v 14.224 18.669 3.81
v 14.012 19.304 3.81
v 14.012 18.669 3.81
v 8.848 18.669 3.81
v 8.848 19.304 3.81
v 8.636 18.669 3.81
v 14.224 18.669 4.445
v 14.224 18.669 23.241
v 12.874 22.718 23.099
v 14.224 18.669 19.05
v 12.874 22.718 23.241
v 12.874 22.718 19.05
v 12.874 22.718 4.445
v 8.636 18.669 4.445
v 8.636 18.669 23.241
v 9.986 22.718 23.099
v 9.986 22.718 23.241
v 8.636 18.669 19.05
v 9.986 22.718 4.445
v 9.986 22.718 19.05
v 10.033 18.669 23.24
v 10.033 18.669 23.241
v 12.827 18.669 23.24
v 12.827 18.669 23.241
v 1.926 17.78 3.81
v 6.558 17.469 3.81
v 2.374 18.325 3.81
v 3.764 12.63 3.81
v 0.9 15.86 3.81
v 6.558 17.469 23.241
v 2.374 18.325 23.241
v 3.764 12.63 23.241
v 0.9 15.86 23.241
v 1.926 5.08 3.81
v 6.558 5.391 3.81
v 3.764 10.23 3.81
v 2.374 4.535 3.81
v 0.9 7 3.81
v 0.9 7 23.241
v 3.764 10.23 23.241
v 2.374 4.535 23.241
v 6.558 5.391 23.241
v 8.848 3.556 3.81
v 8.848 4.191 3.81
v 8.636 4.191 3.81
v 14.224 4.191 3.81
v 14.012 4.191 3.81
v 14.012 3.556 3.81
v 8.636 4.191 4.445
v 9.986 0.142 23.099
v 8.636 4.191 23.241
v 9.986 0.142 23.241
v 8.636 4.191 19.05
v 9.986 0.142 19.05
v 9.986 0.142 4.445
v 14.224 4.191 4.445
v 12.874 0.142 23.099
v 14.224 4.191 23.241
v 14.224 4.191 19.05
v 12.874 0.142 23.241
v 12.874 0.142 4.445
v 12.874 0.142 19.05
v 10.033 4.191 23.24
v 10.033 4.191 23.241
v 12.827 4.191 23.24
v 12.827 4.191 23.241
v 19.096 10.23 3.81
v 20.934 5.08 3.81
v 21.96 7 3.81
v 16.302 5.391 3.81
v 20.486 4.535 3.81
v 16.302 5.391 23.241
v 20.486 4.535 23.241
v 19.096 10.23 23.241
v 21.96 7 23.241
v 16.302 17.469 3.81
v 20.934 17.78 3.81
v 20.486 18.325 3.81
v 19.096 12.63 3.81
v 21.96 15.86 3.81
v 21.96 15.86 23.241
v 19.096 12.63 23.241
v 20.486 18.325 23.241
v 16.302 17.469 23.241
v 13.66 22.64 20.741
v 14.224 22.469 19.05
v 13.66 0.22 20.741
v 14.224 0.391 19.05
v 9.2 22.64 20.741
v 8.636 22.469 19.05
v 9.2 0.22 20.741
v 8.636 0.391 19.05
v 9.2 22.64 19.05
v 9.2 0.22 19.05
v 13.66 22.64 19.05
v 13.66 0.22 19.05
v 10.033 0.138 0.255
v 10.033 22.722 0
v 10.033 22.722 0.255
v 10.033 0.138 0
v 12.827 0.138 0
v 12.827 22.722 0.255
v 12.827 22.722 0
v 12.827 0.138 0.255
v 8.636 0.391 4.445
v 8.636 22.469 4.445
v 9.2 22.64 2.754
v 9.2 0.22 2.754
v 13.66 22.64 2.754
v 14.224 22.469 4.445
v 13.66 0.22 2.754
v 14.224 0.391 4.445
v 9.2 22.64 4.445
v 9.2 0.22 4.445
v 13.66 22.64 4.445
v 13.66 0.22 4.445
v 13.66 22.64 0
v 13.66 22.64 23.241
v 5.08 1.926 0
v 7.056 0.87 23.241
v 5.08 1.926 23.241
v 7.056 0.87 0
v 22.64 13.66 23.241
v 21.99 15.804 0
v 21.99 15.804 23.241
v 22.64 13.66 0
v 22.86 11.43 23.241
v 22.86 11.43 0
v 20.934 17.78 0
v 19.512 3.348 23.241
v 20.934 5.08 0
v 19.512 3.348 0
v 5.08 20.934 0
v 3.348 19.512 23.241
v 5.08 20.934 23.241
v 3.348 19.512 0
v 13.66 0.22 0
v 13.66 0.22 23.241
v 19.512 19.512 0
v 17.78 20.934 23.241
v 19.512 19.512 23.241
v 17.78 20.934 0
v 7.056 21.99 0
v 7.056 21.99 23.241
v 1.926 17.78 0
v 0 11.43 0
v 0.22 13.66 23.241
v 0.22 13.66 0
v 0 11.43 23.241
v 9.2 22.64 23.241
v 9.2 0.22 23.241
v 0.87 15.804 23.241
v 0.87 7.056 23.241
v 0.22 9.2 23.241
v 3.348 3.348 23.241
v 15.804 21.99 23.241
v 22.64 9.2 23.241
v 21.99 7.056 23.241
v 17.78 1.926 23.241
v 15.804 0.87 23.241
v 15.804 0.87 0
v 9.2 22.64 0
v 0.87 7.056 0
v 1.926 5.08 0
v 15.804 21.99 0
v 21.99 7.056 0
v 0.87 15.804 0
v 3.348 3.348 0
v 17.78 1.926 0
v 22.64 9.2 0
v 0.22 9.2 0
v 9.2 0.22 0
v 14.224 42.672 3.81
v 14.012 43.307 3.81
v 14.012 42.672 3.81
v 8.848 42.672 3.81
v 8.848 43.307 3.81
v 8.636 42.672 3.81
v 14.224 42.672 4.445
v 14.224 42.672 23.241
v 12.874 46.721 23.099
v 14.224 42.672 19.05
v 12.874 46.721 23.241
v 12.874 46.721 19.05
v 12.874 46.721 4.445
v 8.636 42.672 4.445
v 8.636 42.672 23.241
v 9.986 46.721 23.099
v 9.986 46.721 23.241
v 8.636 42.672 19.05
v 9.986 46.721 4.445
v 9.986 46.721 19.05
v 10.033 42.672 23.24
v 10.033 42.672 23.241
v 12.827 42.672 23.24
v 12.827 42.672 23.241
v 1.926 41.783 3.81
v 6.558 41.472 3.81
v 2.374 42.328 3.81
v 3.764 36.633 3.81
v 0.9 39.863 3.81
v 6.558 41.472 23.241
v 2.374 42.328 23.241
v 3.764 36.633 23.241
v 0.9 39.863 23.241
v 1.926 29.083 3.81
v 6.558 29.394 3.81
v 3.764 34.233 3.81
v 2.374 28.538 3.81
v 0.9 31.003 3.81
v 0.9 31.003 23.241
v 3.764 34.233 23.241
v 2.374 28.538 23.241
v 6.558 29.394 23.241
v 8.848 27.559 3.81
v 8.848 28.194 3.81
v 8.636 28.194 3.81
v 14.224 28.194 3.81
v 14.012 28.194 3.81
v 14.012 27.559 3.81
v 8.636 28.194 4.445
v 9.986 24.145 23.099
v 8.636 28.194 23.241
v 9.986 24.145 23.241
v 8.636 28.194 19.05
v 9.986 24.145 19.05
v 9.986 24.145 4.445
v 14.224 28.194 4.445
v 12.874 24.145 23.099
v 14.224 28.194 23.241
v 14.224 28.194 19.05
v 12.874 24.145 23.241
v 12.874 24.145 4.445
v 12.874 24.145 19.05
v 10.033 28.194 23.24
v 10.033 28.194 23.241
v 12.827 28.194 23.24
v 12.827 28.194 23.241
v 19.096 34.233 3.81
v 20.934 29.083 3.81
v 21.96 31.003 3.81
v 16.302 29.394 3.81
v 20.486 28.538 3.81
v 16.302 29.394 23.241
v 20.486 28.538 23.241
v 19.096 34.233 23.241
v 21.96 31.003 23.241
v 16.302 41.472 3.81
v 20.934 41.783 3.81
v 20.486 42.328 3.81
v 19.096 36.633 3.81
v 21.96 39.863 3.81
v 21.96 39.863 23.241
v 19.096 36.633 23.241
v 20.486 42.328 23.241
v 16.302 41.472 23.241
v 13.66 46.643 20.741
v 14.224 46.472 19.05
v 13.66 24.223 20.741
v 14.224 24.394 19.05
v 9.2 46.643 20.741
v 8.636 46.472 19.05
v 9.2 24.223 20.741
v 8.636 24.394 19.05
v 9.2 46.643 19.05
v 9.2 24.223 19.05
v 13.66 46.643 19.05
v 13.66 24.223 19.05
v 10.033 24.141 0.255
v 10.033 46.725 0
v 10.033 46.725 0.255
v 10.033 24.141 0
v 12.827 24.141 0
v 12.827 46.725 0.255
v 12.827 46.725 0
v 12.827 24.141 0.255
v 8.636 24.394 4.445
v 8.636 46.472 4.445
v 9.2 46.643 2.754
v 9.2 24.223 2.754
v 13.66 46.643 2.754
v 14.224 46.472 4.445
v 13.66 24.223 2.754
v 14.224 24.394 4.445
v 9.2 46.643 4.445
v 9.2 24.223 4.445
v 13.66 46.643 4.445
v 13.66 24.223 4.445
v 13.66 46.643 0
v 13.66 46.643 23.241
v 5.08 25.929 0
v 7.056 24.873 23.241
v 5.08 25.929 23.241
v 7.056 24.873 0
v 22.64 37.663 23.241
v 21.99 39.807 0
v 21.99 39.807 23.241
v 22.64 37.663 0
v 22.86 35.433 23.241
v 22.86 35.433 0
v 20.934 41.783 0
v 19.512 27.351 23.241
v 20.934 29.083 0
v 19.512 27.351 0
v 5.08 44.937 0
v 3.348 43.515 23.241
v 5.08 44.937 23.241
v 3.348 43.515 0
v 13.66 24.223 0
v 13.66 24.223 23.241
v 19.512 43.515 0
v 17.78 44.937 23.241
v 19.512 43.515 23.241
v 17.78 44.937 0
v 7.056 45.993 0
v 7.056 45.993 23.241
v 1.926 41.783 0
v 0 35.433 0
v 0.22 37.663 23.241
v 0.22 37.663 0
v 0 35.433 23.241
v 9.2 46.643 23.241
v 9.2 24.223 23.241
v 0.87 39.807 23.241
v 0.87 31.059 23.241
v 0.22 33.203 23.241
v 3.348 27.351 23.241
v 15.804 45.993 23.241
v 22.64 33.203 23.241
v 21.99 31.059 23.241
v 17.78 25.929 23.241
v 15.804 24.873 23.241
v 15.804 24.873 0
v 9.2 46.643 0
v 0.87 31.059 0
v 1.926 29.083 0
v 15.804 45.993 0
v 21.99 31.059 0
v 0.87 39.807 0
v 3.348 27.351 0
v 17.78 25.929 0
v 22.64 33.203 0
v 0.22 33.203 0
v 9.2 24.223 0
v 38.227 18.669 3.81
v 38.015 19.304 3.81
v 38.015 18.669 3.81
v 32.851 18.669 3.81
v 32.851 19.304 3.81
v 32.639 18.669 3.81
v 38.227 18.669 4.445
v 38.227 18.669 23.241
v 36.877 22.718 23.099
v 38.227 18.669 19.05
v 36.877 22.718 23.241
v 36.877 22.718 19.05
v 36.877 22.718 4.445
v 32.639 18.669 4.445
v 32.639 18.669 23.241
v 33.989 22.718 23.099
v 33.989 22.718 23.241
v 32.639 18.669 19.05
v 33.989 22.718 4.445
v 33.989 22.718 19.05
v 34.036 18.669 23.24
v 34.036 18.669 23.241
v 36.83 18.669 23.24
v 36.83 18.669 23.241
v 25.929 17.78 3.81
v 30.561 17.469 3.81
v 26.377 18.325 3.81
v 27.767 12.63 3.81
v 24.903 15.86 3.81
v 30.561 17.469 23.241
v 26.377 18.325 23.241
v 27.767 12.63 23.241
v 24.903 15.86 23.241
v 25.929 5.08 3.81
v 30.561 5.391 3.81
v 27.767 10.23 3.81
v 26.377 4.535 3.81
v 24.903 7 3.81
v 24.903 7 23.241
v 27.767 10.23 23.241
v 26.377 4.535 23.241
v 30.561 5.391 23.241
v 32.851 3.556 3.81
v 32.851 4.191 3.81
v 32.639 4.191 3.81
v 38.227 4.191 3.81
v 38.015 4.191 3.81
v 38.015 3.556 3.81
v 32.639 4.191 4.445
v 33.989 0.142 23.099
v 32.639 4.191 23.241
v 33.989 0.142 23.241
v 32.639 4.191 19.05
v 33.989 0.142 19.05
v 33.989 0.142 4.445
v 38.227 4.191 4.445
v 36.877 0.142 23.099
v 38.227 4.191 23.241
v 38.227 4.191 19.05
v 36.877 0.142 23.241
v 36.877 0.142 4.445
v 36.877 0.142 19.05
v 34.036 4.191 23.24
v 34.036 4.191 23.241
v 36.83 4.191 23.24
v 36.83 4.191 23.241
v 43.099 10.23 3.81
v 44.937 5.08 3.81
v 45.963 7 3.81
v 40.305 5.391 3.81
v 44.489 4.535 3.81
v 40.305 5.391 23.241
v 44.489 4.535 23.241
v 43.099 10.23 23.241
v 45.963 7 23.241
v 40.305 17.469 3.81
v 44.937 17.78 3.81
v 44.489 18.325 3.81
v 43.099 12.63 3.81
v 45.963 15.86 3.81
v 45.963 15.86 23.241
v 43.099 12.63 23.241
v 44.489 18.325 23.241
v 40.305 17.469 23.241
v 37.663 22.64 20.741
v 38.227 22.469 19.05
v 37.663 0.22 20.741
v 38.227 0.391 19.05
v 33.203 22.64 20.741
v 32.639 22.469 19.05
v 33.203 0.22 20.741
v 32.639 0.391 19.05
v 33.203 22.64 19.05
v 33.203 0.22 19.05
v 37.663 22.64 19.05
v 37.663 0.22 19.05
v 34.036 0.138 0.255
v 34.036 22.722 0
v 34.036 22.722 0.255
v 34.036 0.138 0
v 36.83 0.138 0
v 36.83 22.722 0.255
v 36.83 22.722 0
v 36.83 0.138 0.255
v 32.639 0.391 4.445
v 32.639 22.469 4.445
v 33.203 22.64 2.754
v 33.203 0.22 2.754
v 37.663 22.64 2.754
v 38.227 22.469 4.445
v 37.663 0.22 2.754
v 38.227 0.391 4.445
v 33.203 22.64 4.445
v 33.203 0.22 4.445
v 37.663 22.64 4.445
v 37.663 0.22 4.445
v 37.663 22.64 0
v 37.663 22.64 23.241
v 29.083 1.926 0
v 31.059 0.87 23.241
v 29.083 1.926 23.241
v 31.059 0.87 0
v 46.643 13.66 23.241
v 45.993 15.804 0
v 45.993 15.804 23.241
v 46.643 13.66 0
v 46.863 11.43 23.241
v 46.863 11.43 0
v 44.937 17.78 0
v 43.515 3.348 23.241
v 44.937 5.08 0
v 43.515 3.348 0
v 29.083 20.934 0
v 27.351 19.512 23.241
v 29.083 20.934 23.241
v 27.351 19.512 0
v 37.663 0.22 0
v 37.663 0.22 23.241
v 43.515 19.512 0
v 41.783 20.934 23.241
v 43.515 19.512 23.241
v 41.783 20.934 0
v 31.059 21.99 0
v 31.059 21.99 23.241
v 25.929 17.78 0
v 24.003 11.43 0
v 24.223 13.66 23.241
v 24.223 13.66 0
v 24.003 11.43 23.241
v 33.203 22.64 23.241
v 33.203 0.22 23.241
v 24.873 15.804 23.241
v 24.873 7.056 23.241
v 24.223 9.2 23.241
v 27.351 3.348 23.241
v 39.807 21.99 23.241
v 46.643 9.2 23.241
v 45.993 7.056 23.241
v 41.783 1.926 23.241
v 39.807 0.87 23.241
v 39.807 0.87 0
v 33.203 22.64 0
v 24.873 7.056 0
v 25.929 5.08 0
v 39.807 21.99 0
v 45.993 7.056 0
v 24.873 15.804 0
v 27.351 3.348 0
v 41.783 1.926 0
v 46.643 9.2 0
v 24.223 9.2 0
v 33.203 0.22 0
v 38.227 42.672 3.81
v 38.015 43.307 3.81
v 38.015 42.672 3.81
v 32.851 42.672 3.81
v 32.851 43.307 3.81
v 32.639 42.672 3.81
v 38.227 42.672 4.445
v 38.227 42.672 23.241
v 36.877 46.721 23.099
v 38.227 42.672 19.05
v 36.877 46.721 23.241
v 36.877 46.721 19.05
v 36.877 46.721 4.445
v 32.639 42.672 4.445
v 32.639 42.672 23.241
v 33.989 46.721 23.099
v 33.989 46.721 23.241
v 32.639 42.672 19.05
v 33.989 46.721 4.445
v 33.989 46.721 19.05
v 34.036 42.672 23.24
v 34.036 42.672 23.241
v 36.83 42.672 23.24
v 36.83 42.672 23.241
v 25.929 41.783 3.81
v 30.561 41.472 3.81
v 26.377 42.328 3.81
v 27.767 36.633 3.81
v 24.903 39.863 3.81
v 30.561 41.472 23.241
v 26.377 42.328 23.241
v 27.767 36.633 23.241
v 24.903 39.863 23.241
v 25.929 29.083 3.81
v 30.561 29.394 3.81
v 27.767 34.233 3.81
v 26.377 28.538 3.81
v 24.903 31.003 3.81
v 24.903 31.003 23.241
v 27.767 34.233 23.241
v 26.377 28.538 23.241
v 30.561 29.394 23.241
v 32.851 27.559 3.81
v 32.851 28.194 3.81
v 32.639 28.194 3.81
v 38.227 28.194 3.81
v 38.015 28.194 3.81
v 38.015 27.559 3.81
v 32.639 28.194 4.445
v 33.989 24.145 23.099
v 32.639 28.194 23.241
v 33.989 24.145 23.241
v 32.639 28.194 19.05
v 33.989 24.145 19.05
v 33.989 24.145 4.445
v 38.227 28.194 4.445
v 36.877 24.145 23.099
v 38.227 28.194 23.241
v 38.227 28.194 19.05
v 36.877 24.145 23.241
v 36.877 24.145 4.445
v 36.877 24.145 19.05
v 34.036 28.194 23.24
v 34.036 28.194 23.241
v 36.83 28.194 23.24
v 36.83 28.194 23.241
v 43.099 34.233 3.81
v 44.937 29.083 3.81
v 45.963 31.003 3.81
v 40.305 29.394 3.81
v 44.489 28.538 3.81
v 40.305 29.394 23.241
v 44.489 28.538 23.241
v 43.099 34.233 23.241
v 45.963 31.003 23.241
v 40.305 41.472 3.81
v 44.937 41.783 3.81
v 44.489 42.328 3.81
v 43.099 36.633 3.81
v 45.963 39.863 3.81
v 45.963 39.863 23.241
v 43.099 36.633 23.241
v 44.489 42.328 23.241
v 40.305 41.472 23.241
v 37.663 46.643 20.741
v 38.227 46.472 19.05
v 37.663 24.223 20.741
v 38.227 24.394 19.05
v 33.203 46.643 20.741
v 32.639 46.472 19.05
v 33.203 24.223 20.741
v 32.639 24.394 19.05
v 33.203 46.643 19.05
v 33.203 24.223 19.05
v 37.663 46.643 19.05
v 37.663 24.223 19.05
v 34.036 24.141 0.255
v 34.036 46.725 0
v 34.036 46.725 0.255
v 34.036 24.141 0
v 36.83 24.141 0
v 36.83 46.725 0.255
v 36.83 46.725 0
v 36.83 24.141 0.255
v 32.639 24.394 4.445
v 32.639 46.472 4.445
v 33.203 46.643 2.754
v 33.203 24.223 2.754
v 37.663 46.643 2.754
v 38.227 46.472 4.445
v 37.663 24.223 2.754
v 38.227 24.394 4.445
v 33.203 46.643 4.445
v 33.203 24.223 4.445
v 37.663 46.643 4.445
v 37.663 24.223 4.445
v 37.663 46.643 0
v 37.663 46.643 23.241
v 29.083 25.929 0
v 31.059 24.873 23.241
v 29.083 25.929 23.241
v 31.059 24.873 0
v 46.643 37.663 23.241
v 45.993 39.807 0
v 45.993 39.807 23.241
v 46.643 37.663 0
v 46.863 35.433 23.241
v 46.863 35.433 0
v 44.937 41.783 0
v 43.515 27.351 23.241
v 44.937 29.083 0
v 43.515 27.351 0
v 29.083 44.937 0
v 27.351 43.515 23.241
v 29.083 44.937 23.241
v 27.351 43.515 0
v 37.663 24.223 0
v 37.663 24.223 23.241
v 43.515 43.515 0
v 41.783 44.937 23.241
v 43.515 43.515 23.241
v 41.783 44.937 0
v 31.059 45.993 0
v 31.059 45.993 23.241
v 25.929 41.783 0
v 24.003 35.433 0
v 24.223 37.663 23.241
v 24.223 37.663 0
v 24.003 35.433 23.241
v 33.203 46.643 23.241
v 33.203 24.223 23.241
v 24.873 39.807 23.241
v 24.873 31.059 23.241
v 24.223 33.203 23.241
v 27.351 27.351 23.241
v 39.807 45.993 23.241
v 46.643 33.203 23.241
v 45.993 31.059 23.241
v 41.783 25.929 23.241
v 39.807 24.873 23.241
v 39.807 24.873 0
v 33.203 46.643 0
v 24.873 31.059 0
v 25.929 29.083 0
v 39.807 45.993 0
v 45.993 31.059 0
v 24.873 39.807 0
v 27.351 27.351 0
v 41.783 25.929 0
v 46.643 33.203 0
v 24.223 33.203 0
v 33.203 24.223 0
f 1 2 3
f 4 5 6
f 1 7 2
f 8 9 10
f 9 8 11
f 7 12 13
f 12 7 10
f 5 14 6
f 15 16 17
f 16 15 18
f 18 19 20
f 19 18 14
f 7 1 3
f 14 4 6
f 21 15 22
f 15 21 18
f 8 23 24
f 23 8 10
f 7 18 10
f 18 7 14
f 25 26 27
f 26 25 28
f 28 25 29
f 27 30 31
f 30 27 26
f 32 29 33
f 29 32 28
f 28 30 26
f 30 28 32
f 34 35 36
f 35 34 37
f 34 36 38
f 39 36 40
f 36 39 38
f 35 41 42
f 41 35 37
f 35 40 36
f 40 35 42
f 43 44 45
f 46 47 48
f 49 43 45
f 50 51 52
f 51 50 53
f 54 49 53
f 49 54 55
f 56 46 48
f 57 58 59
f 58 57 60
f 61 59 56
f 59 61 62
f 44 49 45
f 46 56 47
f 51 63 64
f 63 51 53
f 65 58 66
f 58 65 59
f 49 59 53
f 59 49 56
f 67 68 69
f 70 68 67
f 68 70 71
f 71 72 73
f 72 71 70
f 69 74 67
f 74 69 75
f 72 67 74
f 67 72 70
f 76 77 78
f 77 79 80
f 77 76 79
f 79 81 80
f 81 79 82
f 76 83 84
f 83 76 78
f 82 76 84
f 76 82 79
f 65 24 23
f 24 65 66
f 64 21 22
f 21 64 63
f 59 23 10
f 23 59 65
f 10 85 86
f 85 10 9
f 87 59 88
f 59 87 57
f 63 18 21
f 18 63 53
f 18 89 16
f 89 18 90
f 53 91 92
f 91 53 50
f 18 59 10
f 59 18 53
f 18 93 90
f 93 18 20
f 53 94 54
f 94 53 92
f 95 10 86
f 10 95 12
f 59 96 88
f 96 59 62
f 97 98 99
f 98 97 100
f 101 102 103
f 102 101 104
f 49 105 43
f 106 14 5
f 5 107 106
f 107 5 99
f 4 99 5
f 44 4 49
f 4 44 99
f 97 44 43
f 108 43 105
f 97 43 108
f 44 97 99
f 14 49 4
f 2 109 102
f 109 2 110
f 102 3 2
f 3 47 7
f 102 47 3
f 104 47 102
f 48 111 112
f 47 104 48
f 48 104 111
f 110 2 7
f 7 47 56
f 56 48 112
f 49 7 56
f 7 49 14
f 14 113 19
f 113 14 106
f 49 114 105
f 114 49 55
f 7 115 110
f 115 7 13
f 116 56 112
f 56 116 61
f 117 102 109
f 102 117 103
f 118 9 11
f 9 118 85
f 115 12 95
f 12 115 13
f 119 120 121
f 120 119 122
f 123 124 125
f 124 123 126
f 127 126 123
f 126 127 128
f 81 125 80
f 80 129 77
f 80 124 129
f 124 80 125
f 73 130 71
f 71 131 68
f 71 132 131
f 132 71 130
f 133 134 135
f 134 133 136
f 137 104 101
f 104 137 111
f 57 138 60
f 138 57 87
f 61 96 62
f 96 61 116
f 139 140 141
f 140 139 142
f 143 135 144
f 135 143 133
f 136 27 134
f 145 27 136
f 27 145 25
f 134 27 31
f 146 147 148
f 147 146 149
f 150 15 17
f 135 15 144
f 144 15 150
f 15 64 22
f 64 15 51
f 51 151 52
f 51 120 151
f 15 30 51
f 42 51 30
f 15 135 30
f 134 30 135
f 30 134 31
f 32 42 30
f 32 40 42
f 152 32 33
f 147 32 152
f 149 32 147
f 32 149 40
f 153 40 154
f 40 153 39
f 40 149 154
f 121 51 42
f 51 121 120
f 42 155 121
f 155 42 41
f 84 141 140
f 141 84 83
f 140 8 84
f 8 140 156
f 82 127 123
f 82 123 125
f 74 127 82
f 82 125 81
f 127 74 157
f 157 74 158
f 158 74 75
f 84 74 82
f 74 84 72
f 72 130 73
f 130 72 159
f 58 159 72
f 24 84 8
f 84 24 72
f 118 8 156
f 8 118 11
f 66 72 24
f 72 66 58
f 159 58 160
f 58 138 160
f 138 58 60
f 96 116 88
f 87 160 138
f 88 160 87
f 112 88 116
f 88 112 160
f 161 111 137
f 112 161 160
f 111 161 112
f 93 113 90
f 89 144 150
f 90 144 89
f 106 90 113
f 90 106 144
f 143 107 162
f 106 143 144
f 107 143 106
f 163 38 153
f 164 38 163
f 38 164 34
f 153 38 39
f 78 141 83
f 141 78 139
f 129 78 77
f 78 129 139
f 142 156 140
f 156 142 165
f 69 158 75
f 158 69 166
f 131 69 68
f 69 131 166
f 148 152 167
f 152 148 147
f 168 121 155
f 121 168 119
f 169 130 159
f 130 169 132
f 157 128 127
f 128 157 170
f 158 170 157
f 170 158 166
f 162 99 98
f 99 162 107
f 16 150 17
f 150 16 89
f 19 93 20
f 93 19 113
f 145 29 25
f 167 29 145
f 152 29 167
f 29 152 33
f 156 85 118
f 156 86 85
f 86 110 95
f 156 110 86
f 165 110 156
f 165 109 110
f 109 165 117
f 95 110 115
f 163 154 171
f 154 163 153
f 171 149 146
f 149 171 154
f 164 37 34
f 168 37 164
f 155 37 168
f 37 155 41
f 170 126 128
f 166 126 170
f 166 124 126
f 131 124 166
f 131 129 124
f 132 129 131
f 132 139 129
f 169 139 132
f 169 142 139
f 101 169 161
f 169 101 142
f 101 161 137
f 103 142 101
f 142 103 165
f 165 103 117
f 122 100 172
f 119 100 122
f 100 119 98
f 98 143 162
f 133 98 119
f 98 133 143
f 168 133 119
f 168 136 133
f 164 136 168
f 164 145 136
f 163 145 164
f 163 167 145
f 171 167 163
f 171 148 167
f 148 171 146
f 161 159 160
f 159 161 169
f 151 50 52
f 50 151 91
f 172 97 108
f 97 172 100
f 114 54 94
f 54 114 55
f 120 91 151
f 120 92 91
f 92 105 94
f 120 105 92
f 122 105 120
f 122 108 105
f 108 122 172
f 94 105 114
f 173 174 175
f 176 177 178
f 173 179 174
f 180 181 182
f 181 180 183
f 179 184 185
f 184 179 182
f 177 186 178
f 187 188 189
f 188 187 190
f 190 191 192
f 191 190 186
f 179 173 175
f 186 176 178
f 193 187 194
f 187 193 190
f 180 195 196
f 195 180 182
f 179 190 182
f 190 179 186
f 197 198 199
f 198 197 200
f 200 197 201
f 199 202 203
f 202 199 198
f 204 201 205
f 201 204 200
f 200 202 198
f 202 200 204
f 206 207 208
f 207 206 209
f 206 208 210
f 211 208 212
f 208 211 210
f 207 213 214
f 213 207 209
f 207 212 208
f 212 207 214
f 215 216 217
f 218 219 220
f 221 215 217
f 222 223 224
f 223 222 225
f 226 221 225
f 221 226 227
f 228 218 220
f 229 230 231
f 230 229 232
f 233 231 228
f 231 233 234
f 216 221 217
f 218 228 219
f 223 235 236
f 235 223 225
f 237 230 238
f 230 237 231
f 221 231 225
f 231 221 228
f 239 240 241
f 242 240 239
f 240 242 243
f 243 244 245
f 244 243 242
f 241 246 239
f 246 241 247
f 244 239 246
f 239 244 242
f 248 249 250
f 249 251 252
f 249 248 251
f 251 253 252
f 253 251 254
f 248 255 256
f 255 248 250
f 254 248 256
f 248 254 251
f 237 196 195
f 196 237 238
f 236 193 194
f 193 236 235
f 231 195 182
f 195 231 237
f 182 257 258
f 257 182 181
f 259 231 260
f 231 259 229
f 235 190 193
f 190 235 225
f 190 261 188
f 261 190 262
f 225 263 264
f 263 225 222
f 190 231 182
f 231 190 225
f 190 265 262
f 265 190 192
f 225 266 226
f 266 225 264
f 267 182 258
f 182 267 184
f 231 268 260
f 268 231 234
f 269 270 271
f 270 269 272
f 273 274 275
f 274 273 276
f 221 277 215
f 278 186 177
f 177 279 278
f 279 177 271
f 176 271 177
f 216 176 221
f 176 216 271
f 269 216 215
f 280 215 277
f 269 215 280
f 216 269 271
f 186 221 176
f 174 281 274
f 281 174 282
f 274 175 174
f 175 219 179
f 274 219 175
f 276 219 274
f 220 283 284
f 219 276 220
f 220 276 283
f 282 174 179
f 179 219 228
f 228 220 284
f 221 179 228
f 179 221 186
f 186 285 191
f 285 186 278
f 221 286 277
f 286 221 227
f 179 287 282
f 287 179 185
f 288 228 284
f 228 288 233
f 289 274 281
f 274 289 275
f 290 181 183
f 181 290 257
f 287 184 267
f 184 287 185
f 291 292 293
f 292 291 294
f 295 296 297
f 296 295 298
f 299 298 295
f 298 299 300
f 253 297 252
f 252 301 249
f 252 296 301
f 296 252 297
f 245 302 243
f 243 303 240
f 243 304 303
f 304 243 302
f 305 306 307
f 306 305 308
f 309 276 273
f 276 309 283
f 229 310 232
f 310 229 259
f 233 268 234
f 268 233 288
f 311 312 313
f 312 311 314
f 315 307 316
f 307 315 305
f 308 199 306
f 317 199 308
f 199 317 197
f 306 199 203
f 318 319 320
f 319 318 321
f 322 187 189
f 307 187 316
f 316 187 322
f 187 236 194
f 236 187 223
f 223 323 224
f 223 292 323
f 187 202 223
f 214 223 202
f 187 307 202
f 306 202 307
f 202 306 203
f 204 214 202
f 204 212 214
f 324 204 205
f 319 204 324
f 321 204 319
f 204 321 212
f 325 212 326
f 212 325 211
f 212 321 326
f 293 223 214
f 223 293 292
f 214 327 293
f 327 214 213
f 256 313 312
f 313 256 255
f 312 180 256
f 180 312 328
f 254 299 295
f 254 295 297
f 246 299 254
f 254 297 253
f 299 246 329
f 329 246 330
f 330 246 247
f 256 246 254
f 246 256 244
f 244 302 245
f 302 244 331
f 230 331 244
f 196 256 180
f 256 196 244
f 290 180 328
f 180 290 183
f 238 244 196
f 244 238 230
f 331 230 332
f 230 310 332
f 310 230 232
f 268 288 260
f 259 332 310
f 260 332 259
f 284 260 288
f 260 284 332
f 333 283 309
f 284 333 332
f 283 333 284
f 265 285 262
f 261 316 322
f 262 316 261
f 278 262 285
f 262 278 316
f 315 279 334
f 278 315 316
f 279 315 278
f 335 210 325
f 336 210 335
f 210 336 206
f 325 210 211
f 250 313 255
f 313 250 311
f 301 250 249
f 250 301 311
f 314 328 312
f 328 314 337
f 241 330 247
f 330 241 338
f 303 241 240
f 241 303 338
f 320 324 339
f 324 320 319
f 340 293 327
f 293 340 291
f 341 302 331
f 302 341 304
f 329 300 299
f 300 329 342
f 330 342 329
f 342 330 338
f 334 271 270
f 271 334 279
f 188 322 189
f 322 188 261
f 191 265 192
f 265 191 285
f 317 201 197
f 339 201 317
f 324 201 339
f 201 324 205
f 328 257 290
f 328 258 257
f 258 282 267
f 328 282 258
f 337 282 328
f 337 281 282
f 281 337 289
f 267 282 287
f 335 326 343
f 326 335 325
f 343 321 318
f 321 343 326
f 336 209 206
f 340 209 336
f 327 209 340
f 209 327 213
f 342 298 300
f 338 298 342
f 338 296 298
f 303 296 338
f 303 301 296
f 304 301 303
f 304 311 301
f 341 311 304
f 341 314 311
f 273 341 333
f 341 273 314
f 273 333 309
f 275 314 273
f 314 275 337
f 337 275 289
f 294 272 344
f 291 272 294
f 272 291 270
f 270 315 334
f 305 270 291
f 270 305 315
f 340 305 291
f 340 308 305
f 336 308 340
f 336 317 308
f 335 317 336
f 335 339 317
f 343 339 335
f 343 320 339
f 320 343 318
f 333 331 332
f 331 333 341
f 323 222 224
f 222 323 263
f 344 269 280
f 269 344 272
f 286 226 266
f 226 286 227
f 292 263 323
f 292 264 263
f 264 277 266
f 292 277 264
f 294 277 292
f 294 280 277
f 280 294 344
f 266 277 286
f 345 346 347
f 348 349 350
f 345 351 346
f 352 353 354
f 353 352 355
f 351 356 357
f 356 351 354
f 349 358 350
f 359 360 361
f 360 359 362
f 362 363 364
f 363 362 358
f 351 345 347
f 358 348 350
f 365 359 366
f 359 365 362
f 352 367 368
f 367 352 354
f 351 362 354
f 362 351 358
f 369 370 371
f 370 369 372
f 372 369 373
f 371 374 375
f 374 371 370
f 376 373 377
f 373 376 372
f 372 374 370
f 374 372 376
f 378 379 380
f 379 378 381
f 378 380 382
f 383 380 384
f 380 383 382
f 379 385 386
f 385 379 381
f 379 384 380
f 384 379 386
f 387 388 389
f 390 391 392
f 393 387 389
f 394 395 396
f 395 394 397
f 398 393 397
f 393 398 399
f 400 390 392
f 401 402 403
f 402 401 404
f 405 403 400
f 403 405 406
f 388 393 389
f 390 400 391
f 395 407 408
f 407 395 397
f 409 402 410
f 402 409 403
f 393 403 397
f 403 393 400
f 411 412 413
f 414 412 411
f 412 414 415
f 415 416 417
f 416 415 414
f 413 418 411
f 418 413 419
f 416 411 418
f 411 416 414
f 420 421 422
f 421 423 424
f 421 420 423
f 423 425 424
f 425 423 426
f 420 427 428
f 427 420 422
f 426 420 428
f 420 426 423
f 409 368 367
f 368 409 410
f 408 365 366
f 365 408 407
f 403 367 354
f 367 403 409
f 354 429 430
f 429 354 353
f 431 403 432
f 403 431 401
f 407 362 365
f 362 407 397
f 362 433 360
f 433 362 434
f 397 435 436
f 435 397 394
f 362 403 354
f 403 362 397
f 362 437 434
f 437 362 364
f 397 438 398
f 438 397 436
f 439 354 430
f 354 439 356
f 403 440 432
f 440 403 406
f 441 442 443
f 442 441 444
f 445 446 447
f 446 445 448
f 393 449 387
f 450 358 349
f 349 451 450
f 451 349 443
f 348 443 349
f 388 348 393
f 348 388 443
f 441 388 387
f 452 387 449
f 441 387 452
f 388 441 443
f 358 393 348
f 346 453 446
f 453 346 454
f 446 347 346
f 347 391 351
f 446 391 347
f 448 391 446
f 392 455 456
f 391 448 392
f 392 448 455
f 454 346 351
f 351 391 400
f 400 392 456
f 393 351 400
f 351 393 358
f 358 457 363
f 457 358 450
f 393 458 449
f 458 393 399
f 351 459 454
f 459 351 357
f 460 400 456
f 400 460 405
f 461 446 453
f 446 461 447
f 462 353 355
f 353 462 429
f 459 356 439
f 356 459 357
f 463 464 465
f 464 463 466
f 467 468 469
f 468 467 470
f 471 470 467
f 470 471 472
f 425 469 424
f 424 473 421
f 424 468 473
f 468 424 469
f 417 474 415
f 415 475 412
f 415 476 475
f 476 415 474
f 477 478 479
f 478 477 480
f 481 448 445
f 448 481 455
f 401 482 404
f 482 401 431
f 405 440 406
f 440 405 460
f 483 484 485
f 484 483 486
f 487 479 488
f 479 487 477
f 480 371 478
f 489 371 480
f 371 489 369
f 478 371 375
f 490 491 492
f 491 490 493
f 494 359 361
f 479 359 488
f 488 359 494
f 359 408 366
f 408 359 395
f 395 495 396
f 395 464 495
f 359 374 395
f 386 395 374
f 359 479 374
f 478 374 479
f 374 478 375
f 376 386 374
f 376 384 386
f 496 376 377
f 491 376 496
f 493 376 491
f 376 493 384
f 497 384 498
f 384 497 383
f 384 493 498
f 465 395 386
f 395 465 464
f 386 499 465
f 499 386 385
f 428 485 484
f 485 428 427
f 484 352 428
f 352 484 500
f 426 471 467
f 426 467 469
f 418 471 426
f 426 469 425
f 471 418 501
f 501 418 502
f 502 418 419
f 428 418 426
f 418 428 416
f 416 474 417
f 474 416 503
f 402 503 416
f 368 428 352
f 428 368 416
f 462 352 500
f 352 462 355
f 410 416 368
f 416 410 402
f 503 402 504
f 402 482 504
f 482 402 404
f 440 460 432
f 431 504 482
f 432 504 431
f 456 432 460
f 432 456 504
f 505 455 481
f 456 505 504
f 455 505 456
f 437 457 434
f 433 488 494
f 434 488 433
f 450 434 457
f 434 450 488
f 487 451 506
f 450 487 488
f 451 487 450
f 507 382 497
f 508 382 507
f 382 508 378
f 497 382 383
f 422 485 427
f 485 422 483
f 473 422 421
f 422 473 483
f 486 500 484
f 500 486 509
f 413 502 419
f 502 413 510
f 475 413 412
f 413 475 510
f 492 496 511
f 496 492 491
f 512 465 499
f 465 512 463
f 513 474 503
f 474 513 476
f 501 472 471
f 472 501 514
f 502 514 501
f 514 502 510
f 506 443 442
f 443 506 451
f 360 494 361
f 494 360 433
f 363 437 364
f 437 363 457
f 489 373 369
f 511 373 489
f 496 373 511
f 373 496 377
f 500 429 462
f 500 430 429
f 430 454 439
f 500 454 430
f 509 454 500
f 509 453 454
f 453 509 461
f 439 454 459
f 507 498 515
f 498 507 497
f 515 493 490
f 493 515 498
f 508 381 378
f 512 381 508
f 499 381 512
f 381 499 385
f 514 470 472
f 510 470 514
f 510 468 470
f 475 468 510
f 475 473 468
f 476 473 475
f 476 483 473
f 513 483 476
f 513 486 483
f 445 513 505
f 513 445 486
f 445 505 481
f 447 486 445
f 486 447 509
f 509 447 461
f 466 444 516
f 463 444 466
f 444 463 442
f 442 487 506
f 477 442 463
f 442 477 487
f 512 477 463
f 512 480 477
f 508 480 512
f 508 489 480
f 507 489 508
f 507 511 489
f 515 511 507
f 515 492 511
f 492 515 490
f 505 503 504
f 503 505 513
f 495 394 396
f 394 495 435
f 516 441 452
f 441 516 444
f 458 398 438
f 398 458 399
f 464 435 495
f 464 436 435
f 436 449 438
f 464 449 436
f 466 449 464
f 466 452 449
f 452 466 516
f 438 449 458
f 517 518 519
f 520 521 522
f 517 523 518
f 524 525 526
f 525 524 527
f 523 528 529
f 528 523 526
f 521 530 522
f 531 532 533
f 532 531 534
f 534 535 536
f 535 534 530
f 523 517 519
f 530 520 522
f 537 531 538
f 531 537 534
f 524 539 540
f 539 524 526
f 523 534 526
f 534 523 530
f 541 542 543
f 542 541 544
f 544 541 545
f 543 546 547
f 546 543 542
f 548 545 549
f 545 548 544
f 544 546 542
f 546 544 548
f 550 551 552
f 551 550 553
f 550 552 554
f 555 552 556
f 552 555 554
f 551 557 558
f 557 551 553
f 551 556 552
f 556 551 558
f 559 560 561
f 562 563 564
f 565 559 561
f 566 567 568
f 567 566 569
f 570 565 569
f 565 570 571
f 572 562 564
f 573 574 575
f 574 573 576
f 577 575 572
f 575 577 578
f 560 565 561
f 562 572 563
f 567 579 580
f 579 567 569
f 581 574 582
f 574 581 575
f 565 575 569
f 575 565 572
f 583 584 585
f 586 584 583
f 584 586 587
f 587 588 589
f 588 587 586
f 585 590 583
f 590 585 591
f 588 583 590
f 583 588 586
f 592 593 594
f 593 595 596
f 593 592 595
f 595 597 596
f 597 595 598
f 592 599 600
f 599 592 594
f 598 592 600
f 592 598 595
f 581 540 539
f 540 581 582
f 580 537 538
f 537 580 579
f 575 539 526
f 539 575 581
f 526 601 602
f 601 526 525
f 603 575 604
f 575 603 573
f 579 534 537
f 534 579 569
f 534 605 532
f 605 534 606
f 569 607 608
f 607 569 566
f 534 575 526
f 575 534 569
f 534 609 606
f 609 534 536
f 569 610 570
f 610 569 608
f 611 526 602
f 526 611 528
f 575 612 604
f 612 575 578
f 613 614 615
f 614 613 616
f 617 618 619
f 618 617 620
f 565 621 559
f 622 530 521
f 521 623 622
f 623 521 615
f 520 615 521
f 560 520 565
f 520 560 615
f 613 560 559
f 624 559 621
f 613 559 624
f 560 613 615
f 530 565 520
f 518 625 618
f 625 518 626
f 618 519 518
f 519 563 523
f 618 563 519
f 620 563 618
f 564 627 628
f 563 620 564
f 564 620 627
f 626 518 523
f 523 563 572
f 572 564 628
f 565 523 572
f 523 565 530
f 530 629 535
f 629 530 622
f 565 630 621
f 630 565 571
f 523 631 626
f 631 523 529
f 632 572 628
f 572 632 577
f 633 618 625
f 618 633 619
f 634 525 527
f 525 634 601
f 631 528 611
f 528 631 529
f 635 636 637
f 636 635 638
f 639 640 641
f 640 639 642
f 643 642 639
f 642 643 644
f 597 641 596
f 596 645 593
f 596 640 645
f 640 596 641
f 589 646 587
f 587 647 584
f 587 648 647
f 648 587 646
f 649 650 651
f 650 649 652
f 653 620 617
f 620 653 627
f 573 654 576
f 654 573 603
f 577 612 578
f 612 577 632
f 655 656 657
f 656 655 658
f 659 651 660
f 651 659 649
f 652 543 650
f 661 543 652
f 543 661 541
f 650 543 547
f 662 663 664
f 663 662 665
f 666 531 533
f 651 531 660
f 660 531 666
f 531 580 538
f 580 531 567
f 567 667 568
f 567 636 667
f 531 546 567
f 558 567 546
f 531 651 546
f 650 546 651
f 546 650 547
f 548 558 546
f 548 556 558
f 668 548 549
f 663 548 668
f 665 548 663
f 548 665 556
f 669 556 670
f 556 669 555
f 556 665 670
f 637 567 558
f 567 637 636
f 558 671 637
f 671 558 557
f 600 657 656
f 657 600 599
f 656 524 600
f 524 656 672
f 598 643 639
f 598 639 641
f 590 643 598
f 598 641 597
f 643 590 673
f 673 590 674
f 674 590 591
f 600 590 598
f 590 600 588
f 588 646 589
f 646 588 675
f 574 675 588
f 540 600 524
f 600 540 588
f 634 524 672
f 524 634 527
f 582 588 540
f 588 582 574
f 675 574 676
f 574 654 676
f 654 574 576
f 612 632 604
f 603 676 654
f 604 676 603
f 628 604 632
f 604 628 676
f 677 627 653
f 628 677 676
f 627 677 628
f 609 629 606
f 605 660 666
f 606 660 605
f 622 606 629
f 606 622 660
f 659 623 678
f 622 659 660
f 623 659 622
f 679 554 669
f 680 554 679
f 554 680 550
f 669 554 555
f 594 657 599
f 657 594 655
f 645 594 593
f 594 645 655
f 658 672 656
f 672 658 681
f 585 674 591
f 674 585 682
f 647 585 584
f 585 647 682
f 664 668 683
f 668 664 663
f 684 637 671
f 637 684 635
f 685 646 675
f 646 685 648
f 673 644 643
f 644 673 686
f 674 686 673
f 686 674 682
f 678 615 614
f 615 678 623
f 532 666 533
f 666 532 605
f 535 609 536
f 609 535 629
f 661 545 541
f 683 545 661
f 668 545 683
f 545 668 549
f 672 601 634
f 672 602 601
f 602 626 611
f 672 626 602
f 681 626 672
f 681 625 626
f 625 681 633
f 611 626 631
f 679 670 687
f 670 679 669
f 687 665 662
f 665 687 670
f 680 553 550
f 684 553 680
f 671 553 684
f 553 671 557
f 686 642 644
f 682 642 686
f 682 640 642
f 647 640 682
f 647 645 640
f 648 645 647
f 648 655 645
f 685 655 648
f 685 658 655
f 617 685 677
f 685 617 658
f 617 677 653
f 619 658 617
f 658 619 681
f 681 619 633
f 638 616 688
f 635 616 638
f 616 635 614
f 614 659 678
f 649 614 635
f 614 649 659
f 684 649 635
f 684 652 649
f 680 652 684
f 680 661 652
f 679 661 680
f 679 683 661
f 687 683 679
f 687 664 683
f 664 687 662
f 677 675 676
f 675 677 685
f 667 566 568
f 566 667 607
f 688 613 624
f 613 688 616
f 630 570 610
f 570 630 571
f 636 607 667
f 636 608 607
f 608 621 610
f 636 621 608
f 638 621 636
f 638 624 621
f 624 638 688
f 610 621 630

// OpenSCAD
// file: FlaviaPrims.scad
// all measurements in inches
$fn=32; // round things are drawn in 32 segments

InnerWidth = 0.6;
SlotWidth = 0.3;
InnerThickness = 0.1;
TabLength = 1.0;
Offset = 0.125; 
JoinerWidth = SlotWidth * 1.5;

DoveTailSlotMul = 1.10;

BumpDia = 0.1;
BumpOffset = TabLength - 0.22; 

module GussetHub() {
  translate([-0.5*InnerWidth, -0.5 * InnerWidth, 0])
    cube([InnerWidth, InnerWidth, InnerThickness]);
}

module GussetPlate() {
  rotate([180, 0, 0]) translate([0.25*TabLength, -0.5 * InnerWidth, 0]) InnerPlate();
}

module InnerPlate() {
  cube([TabLength, InnerWidth, InnerThickness], false);
  translate([BumpOffset, InnerWidth * 0.5, InnerThickness]) sphere(d=BumpDia);
}

module InnerPlateBump() {
  InnerPlate();
  yoff = 0.5 * (InnerWidth - SlotWidth);
  translate([0, yoff, -InnerThickness]) cube([TabLength, SlotWidth, InnerThickness], false);
}

module JoinerPlate() {
  cube([TabLength, JoinerWidth, InnerThickness]);
}


module Tab() {
  translate([Offset, 0, -InnerThickness / 2]) InnerPlate(); 
}

module Hub() {
  rotate([-90, 0, 0]) cylinder(d = Offset * 2.2, h = InnerWidth); 
}

module F2x60() {
  Tab();
  rotate([0, -60, 0]) Tab();
}

module F3x60() {
  Tab();
  rotate([0, -60, 0]) Tab();
  rotate([0, -120, 0]) Tab();  
}

module F4x60() {
  F2x60();
  rotate([0, -120, 0]) F2x60();
}

module Corner() {
  InnerPlateBump();
  xshift = InnerWidth; // 0.5 * (TabLength - InnerWidth);
  yshift = InnerWidth + 0.2;
  translate([xshift, yshift, 0]) rotate([0, 0, 90]) InnerPlateBump();
  xjshift = JoinerWidth + 0.5 * (InnerWidth - JoinerWidth);
  yjshift = 0.5 * (InnerWidth - SlotWidth);
  translate([xjshift, yjshift, -2 * InnerThickness]) rotate([0, 0, 90]) JoinerPlate();
}
// main file
include <FlaviaPrims.scad>

XPitch = (TabLength * 1.5);
YPitch = TabLength * 1.2;
TailLength = InnerThickness * 1.5;
module DoveTail() {
  linear_extrude(height = InnerWidth)
    polygon(points = [ [-InnerThickness, 0], [InnerThickness, 0],
    		       [InnerThickness * 0.5, TailLength], [-InnerThickness * 0.5, TailLength] ]);
}

module TabNTail() {
  translate([0, -TailLength, 0]) DoveTail();
  translate([-InnerThickness * 0.5, -0.010, 0]) rotate([90, 0, 90]) InnerPlate();
}

module Slots() {
  sc = 1.05;
  difference() {
    cube([InnerWidth * 2, 3 * InnerThickness, InnerWidth]);
    union() {
    translate([InnerWidth * 0.15, InnerThickness * 2, 0]) cylinder(d = 0.5*InnerThickness, h = InnerWidth * 1.2);
    translate([InnerWidth * 0.5, 3 * InnerThickness - TailLength, -0.1 * TailLength]) scale([1.05, 1.05, 1.2]) DoveTail();
    translate([InnerWidth * 1.0, 3 * InnerThickness - TailLength, -0.1 * TailLength]) scale([1.10, 1.10, 1.2]) DoveTail();
    translate([InnerWidth * 1.5, 3 * InnerThickness - TailLength, -0.1 * TailLength]) scale([1.15, 1.15, 1.2]) DoveTail();
    }
  }
}

BarrelRad = 3*TailLength;
BarrelHeight = InnerWidth + 2.1 * TailLength;
module RadialTab(sc) {
  translate([0, BarrelRad, 0.1]) scale([sc, sc, 1.1]) TabNTail();
}


module BarrelN(n, sc)
{
  pitch = 360 / n;

  difference() {
    cylinder(d = 2.0 * BarrelRad, h = BarrelHeight);
    for(ang = [0:pitch:360])
      rotate([0, 0, ang]) {
        scale([1,1,1.5]) RadialTab(sc);
      }
   translate([0, 2.5 * InnerWidth, BarrelHeight]) rotate([90, 0, 0]) scale([sc, sc, 5]) TabNTail();      
   rotate([0, 180,0])    translate([0, 2.5 * InnerWidth, -0.01]) rotate([90, 0, 0]) scale([sc, sc, 5]) TabNTail();            
  }
}

module ExpPair()
{
   translate([0, TailLength, 0]) TabNTail();
   translate([InnerThickness * 1.5, 0, 0]) Slots();
}

scale([25.4, 25.4, 25.4]) {
  for(x=[BarrelRad:2.1*BarrelRad:2])
    for(y = [BarrelRad:2.1*BarrelRad:2])
      translate([x, y, 0]) BarrelN(6, DoveTailSlotMul);
}
